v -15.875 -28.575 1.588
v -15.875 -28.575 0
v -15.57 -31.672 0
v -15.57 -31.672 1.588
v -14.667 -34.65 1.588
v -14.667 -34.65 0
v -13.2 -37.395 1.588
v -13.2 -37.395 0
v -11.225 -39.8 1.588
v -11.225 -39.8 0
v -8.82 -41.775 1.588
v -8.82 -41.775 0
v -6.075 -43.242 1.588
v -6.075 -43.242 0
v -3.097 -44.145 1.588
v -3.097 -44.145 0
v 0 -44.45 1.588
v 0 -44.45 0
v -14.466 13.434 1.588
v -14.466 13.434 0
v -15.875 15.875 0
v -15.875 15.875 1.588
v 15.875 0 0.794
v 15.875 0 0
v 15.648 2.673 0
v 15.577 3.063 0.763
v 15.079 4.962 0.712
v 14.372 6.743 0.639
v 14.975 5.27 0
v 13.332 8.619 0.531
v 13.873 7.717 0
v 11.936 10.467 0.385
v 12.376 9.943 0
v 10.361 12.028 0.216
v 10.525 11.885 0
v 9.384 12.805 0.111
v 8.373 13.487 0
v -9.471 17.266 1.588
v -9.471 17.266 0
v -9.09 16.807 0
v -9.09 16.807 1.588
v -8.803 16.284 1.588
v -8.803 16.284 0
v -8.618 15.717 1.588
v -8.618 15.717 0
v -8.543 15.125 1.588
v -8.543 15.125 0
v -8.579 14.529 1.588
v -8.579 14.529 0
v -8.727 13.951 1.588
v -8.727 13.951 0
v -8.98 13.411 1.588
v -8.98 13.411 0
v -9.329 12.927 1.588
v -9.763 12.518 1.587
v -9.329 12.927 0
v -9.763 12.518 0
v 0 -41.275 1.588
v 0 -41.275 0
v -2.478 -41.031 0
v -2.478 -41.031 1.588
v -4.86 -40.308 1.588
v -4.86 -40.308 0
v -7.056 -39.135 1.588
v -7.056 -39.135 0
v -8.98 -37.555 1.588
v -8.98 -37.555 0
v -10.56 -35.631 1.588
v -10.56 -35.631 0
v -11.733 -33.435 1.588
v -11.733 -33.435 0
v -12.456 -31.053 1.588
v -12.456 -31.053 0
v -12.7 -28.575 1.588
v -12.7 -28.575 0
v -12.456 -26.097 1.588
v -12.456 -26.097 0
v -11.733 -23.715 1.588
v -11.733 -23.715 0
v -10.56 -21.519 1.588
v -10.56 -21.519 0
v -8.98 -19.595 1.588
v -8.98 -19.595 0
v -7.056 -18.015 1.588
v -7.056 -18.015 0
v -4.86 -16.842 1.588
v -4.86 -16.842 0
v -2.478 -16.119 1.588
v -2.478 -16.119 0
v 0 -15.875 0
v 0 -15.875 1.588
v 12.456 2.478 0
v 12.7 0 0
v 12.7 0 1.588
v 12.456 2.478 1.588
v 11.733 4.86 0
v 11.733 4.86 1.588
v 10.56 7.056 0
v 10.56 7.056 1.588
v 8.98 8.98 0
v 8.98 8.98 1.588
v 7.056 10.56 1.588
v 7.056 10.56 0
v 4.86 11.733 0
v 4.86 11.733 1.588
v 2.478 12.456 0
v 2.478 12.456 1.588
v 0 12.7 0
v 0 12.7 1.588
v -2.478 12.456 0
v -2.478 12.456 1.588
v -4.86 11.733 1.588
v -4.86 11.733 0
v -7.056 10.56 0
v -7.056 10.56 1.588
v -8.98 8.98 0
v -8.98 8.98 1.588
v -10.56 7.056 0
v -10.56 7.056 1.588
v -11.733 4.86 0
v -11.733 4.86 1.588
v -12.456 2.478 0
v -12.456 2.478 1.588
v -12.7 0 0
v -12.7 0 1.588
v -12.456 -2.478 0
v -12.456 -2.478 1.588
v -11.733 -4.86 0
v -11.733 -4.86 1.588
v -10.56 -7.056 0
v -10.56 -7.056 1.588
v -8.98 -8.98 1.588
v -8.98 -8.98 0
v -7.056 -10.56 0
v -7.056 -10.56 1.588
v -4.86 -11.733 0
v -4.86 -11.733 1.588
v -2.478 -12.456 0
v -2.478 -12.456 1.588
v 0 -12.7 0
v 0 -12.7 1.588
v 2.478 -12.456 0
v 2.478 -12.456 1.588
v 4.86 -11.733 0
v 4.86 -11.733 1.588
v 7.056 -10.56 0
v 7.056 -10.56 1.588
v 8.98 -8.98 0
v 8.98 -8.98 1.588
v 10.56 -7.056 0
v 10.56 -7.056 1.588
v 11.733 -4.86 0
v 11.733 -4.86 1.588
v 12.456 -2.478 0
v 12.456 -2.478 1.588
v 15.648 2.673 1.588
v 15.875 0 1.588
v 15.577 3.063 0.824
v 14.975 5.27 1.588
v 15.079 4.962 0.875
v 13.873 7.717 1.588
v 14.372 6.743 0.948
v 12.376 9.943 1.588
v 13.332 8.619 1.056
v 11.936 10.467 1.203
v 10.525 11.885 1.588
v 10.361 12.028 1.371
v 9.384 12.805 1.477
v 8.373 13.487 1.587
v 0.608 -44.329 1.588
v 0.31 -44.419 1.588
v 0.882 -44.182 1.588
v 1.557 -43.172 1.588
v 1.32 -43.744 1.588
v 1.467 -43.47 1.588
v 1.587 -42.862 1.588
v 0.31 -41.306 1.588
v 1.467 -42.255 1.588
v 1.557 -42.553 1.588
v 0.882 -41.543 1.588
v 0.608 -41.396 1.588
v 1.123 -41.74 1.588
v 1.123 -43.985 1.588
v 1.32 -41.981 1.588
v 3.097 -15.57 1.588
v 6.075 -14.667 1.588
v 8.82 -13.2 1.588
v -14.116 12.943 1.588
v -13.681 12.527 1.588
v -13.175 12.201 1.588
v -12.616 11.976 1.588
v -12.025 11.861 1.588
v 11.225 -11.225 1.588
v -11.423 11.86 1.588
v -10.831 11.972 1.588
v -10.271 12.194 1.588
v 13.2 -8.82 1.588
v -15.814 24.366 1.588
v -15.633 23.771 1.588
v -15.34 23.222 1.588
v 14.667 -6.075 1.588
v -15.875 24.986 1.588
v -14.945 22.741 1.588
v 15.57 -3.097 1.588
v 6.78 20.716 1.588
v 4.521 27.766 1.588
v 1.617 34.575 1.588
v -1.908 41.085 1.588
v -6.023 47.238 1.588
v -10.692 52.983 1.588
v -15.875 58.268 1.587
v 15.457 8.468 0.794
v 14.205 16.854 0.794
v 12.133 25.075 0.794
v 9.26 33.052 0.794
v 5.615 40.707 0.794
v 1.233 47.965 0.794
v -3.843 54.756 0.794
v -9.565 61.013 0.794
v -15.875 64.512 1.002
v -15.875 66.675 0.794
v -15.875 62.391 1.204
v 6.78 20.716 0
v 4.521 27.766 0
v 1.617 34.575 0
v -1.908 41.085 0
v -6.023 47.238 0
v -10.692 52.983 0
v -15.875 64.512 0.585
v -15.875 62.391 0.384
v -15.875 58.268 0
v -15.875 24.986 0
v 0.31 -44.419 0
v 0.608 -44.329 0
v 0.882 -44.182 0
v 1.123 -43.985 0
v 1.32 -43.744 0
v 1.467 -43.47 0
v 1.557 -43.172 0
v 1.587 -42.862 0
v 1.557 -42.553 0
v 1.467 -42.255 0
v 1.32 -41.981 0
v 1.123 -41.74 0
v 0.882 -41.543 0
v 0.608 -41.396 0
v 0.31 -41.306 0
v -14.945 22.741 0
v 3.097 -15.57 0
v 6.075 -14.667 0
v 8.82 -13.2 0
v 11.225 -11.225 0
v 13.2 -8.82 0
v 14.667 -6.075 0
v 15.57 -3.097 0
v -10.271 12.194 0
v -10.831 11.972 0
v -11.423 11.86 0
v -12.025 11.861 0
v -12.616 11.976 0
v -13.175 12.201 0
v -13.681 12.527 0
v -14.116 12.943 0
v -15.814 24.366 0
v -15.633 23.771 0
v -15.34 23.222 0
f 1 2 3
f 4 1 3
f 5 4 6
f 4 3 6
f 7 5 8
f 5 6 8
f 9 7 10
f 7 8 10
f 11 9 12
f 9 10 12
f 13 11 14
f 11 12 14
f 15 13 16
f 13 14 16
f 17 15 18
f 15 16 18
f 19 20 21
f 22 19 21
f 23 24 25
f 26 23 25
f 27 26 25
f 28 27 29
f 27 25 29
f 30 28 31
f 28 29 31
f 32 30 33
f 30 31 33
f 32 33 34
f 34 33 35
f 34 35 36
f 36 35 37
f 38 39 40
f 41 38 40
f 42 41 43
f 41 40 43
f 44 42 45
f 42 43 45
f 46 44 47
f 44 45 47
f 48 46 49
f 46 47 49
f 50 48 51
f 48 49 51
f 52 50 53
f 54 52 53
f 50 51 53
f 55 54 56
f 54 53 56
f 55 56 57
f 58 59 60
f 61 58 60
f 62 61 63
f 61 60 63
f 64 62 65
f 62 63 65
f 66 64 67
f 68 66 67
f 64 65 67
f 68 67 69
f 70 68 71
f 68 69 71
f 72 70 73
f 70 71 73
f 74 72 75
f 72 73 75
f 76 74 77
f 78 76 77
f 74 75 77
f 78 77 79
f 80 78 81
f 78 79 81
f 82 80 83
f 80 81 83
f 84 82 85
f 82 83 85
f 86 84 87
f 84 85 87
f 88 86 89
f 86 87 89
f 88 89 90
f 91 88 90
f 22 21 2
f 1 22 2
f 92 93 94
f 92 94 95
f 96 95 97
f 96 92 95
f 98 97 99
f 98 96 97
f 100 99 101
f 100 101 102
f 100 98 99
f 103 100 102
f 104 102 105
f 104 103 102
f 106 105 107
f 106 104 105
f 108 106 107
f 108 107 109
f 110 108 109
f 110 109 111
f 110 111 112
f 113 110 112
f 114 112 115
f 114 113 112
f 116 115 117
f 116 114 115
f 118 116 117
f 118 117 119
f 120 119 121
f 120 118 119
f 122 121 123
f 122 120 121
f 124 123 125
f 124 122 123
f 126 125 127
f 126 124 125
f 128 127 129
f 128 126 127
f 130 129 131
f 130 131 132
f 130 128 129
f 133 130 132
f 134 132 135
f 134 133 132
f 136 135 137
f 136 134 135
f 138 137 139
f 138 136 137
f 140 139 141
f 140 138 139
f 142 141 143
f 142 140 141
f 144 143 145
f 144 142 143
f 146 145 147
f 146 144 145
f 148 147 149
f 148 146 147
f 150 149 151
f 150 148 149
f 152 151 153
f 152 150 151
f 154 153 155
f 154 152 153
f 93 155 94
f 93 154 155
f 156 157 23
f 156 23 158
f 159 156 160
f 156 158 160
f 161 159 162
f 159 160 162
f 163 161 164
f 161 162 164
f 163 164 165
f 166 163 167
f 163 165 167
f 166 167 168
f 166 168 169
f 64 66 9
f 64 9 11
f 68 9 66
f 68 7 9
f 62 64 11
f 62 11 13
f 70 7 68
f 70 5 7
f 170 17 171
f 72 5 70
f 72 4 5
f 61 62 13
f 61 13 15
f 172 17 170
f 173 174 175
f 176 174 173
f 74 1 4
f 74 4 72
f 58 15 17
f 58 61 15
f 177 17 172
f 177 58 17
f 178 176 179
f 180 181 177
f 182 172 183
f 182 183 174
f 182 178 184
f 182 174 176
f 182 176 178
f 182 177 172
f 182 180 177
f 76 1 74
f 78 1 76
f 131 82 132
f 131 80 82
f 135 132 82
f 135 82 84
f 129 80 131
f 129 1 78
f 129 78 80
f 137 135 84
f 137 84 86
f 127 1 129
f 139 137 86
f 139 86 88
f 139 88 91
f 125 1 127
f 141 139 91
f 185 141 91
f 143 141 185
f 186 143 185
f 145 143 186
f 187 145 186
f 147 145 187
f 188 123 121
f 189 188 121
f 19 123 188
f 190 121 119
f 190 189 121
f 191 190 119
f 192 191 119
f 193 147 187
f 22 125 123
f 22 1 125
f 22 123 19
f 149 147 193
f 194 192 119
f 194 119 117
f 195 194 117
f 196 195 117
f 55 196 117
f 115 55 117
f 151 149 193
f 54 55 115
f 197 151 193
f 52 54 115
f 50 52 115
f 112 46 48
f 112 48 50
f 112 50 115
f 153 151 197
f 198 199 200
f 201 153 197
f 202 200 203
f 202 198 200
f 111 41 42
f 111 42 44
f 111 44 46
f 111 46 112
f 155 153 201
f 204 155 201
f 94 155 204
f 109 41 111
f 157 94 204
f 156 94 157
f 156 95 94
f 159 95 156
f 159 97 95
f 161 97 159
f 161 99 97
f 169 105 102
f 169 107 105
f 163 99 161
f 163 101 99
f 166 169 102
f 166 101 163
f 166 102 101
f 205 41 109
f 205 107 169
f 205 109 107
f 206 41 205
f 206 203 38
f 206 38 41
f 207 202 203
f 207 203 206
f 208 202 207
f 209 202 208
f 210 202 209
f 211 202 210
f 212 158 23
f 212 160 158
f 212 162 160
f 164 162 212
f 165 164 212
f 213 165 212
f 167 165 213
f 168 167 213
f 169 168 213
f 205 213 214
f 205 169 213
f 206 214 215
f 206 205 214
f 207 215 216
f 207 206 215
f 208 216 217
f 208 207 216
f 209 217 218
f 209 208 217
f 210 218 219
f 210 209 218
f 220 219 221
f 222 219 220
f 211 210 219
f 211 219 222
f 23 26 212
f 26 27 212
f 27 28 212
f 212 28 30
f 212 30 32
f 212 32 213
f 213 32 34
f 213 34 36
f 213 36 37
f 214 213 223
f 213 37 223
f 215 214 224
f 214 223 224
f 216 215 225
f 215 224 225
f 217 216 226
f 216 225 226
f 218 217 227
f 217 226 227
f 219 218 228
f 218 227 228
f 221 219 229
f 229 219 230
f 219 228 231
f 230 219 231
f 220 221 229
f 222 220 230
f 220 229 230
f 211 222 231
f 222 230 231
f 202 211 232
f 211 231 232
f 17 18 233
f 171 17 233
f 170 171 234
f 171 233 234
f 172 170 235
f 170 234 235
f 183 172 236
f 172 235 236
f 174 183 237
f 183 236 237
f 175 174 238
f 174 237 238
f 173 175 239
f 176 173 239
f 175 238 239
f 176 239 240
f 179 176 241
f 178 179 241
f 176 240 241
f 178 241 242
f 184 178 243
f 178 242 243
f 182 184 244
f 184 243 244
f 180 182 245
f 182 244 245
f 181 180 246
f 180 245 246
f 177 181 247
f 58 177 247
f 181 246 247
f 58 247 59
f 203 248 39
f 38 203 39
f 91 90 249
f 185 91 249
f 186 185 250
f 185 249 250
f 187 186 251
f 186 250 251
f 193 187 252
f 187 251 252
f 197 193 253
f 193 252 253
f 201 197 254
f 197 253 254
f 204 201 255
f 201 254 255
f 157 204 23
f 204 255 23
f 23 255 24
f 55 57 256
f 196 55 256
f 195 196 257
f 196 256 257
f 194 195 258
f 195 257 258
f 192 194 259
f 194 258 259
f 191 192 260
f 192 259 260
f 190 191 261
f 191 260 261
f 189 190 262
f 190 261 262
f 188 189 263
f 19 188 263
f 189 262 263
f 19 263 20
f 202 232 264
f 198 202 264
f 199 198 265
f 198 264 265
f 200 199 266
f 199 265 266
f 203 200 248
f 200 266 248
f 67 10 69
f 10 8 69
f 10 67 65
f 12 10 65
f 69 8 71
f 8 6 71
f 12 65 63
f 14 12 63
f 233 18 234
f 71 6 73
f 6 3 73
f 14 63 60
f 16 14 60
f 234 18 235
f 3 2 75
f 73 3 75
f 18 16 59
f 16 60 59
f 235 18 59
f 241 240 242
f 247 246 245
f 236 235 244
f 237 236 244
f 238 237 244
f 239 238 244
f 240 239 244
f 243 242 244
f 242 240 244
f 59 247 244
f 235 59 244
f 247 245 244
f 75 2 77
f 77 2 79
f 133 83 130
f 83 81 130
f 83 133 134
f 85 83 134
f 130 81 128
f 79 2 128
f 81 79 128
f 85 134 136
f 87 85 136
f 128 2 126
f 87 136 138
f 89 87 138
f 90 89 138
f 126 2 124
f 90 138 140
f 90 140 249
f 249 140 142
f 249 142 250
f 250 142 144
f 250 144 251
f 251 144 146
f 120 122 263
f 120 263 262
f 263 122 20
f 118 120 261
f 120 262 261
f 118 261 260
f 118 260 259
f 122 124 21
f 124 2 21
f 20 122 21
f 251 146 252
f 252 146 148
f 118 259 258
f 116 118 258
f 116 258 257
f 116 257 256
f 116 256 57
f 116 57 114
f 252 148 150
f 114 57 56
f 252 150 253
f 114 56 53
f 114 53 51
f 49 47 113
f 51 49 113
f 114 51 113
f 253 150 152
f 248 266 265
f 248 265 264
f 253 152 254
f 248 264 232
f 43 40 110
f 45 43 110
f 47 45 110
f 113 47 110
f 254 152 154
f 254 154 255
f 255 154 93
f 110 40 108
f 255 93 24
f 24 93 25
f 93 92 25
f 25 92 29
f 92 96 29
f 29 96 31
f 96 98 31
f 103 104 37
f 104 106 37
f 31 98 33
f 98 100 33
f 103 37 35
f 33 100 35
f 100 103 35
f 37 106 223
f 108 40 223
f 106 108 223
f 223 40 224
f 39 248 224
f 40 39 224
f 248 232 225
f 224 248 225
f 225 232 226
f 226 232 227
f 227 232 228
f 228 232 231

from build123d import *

# Parameters (mm, degrees)
F1_DEPTH = 1.5875
F2_SIZE2 = 6.35
F2_SIZE  = 0.79375
F3_SIZE2 = 6.34999
F3_SIZE  = 0.79374
F0_R     = 12.7
F4_DEPTH = 1.5875


# Not quite as in the source:
# - a fillet or chamfer is up to 0.001 mm smaller than in the source, because OpenCascade refuses the exact size


with BuildPart() as f1:
    # F0 (on Top) → F1 (new body)
    with BuildSketch(Plane.XY):
        with BuildLine():
            ThreePointArc((-9.7632822165, 12.5177452188), (6.9650383995, 14.2654780885), (15.875, 0))
            ThreePointArc((15.875, 0), (7.5322970835, 36.924308135), (-15.875, 66.675))
            Line((-15.875, 66.675), (-15.875, 24.9856118545))
            ThreePointArc((-15.875, 24.9856118545), (-15.6333175157, 23.7705919567), (-14.9450640303, 22.7405478242))
            Line((-14.9450640303, 22.7405478242), (-9.4708745561, 17.26635835))
            ThreePointArc((-9.4708745561, 17.26635835), (-8.5469409835, 14.8261554131), (-9.7632822165, 12.5177452188))
        make_face()
    extrude(amount=F1_DEPTH)

    # F2
    f2_edges = [f1.edges().sort_by_distance(p)[0] for p in [
        (7.532297, 36.924308, 1.5875),
    ]]
    f2_side = f1.faces().sort_by_distance((7.532297, 36.924308, 0.79375))[0]
    chamfer(f2_edges, length=F2_SIZE, length2=F2_SIZE2, reference=f2_side)

    # F3 (size 0.79375 and 6.35 in the source; OpenCascade refuses exactly that, so slightly less here)
    f3_edges = [f1.edges().sort_by_distance(p)[0] for p in [
        (7.532297, 36.924308, 0),
    ]]
    f3_side = f1.faces().sort_by_distance((7.532297, 36.924308, 0.396875))[0]
    chamfer(f3_edges, length=F3_SIZE, length2=F3_SIZE2, reference=f3_side)

    # F0 (on Top) → F4 (join)
    with BuildSketch(Plane.XY):
        with BuildLine():
            ThreePointArc((0, -15.875), (11.2253201513, -11.2253201513), (15.875, 0))
            ThreePointArc((15.875, 0), (6.9650383995, 14.2654780885), (-9.7632822165, 12.5177452188))
            ThreePointArc((-9.7632822165, 12.5177452188), (-14.2654780885, 6.9650383995), (-15.875, 0))
            Line((-15.875, 0), (-15.875, -28.575))
            ThreePointArc((-15.875, -28.575), (-11.2253201513, -39.8003201513), (0, -44.45))
            ThreePointArc((0, -44.45), (1.5875, -42.8625), (0, -41.275))
            ThreePointArc((0, -41.275), (-12.7, -28.575), (0, -15.875))
        make_face()
        Circle(F0_R, mode=Mode.SUBTRACT)
        with BuildLine():
            ThreePointArc((-15.875, 0), (-14.2654780885, 6.9650383995), (-9.7632822165, 12.5177452188))
            ThreePointArc((-9.7632822165, 12.5177452188), (-12.3230452429, 11.9048786691), (-14.4655692434, 13.4337943198))
            Line((-14.4655692434, 13.4337943198), (-15.875, 15.875))
            Line((-15.875, 15.875), (-15.875, 0))
        make_face()
    extrude(amount=F4_DEPTH)


solid = f1.part
